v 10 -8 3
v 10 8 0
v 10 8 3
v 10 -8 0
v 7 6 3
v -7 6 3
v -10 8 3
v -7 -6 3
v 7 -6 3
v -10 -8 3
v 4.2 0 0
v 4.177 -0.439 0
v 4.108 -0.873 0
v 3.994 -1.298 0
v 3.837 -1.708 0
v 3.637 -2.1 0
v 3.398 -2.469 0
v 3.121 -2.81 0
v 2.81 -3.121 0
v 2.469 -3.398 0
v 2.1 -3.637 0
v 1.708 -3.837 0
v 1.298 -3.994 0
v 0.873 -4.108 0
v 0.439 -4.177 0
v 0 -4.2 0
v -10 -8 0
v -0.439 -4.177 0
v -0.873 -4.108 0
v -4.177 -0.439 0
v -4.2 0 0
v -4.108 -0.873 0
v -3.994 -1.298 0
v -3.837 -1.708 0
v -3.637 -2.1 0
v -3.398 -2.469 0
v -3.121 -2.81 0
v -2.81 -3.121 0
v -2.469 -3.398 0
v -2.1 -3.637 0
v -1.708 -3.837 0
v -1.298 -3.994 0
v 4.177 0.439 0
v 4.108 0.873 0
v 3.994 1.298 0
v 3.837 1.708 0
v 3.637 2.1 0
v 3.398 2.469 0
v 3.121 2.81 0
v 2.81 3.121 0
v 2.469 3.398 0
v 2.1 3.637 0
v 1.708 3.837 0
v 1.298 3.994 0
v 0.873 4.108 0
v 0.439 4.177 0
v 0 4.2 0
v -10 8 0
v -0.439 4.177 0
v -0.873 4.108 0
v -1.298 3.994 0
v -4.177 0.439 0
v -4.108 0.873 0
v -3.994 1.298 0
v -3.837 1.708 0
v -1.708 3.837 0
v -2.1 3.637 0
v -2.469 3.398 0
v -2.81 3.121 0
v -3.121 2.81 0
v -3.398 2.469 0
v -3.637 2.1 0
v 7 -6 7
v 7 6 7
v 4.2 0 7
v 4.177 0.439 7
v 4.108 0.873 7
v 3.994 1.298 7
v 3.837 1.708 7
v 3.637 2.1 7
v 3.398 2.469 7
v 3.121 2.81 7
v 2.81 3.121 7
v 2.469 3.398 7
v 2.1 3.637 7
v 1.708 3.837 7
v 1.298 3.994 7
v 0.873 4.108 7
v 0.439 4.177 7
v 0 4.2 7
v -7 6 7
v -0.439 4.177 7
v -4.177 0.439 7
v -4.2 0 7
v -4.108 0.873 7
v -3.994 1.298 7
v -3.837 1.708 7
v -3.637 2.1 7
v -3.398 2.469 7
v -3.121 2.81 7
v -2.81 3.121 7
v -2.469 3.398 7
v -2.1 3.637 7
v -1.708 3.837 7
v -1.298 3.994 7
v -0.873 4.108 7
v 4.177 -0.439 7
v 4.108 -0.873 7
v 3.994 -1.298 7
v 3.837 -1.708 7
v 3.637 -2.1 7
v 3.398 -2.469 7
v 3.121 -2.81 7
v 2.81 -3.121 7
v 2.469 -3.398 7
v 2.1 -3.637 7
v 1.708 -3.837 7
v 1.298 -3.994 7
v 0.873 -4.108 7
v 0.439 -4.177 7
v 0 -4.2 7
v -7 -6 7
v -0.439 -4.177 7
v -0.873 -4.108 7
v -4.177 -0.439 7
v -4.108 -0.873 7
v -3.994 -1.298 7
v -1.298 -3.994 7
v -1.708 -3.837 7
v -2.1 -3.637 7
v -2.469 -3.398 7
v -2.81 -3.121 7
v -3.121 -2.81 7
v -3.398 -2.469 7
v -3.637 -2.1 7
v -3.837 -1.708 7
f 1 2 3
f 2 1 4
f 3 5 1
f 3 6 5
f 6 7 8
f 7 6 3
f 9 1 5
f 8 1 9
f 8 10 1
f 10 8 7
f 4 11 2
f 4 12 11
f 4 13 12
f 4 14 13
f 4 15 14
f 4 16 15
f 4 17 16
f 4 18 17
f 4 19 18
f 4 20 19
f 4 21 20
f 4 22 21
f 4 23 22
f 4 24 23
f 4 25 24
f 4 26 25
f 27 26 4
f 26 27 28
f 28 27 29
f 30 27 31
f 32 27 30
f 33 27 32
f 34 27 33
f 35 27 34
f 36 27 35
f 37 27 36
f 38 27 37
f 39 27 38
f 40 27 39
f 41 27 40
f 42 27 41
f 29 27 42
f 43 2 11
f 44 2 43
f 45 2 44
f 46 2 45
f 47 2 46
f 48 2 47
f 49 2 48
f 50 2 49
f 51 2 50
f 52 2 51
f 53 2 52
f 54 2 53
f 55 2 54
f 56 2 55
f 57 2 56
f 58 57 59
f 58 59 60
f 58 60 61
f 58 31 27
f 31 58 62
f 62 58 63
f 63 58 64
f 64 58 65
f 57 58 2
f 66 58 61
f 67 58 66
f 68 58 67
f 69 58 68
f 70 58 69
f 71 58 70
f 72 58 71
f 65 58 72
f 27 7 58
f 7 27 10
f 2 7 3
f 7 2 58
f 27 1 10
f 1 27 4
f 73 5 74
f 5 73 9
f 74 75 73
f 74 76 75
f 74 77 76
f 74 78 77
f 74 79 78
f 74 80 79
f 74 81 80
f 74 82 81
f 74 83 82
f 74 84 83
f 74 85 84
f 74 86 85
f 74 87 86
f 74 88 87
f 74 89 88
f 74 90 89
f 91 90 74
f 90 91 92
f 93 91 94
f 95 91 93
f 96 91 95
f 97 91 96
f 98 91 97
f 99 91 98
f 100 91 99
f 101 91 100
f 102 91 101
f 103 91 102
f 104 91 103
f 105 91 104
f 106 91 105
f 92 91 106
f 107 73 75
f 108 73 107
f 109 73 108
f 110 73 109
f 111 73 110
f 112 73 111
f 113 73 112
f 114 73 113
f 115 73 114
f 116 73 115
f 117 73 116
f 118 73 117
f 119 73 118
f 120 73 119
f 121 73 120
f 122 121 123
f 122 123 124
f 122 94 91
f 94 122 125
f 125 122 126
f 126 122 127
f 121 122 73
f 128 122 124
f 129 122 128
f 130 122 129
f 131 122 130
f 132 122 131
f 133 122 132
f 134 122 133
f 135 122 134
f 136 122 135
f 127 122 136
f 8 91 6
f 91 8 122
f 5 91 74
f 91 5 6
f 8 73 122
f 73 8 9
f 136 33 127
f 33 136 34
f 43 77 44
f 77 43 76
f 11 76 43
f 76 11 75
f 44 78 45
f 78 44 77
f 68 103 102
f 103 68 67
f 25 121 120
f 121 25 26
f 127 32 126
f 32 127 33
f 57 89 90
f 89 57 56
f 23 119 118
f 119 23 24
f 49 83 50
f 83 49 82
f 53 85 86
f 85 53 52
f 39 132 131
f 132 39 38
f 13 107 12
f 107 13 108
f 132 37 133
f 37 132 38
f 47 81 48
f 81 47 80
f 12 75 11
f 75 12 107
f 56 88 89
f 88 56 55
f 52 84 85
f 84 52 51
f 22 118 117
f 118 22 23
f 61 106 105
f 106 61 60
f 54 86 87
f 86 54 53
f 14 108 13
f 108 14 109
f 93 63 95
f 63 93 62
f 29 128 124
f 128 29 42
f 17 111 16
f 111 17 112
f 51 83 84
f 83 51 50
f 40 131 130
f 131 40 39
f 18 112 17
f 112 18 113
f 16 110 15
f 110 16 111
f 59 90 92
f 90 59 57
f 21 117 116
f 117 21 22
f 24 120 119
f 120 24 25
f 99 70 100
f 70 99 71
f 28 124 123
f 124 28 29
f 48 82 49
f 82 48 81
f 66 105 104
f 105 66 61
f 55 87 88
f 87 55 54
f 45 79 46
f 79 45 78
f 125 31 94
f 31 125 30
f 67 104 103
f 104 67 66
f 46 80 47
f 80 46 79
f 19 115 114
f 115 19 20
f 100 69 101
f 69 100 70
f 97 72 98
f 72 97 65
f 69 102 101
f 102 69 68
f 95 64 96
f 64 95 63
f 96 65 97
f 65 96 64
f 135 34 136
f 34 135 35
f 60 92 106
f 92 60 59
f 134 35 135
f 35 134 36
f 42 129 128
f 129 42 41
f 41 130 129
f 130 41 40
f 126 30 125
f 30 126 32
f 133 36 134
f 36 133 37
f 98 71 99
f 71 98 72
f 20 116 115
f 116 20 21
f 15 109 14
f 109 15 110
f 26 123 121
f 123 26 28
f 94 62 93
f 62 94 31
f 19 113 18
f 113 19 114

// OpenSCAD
// T-slot nut for aluminium extrusion.
$fn = 60;
eps = 0.02;
slot_w = 12;
thread_d = 8.4;
length = 20;
body_w = slot_w + 4;
body_h = 7;
difference() {
    union() {
        translate([-length / 2, -body_w / 2, 0]) cube([length, body_w, 3]);
        translate([-length / 2 + 3, -slot_w / 2, 3]) cube([length - 6, slot_w, body_h - 3]);
    }
    translate([0, 0, -eps]) cylinder(d = thread_d, h = body_h + 2 * eps);
}
